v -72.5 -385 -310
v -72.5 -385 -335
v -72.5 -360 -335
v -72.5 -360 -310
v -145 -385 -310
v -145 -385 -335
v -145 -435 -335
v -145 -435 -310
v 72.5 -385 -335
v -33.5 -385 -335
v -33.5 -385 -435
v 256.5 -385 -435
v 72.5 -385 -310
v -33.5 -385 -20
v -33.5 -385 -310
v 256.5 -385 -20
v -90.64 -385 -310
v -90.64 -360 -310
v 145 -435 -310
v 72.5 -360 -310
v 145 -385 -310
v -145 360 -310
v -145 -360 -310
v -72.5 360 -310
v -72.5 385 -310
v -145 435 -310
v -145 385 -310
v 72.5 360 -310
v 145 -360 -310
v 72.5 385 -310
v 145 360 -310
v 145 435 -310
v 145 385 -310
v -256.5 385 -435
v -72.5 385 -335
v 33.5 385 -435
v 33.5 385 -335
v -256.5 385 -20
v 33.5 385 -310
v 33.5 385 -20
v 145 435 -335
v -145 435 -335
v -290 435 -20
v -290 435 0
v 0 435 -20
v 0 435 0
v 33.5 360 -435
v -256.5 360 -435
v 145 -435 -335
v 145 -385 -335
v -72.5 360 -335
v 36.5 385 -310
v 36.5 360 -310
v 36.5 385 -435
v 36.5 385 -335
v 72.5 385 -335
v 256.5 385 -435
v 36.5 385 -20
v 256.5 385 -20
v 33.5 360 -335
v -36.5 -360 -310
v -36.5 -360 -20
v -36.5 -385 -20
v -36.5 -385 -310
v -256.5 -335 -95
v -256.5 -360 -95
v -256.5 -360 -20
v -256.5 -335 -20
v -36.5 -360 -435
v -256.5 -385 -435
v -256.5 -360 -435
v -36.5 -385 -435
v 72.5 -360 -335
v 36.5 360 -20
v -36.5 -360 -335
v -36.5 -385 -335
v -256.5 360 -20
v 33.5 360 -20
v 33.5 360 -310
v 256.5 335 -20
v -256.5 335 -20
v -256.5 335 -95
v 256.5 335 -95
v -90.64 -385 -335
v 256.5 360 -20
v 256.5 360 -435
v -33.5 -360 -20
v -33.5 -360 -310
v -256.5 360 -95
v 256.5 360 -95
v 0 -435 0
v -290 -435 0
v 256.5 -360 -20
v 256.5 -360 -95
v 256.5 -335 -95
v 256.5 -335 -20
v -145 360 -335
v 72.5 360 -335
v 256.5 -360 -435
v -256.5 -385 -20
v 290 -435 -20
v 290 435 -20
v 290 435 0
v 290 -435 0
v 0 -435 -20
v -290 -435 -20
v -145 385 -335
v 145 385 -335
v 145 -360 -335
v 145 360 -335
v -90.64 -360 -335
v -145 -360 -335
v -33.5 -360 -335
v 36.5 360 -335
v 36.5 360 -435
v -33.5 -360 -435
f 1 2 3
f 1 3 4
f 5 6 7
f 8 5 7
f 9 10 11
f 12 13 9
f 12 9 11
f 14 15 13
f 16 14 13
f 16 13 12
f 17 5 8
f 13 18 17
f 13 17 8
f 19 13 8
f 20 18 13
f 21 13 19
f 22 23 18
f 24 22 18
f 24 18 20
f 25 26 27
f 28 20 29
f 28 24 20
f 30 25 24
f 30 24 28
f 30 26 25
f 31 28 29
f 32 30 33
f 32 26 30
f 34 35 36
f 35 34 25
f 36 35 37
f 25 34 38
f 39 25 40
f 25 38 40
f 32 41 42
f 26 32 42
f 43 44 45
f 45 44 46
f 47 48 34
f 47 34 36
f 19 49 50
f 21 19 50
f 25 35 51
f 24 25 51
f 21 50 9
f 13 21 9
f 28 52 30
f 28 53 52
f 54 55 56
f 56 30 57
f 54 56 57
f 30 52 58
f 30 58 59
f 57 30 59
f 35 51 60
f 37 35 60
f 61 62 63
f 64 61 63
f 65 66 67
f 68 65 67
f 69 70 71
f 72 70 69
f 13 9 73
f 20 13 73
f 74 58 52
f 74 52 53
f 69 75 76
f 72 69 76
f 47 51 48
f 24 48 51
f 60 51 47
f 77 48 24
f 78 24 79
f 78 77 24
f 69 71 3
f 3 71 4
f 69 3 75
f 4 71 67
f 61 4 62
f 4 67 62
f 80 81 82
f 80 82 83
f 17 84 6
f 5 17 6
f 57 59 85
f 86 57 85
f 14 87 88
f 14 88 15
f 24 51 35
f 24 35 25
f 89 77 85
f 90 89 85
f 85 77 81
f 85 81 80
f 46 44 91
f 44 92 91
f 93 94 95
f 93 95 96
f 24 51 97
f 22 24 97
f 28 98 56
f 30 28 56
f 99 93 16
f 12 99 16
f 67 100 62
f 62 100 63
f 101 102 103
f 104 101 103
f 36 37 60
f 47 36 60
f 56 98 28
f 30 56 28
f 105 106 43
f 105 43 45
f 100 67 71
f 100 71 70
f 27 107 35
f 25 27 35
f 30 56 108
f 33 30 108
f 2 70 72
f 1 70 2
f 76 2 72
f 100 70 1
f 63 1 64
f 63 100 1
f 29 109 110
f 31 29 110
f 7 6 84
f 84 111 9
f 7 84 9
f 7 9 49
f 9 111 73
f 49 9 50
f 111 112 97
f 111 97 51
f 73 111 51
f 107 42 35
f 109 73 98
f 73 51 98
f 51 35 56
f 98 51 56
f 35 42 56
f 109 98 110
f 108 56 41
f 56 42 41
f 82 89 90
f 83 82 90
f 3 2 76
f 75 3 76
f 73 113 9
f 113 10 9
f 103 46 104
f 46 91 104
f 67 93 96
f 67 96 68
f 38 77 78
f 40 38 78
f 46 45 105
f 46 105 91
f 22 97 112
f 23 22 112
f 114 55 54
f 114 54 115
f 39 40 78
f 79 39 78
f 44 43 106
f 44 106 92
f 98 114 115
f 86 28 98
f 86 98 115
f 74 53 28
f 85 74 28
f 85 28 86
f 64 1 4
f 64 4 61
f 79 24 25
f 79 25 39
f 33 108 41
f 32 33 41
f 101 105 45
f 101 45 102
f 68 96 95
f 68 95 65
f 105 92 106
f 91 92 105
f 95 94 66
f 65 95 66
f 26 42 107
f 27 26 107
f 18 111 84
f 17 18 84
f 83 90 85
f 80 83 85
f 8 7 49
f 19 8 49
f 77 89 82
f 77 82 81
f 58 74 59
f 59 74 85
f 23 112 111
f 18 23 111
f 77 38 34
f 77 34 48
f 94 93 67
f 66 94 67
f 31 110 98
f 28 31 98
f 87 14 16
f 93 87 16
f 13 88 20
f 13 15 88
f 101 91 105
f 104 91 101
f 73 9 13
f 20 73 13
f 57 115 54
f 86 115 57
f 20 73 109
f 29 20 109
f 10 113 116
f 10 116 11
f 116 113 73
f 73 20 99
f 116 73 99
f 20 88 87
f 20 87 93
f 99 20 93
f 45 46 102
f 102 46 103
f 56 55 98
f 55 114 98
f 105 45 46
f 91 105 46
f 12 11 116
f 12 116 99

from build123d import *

# Parameters (mm, degrees)
F0_W      = 290
F0_H      = 20
F1_DEPTH  = 435
F2_W      = 290
F2_H      = 20
F3_DEPTH  = 435
F4_W      = 220
F4_H      = 25
F4_W_2    = 290
F5_DEPTH  = 415
F6_W      = 145
F6_H      = 25
F7_DEPTH  = 500
F9_DEPTH  = 25
F10_W     = 513
F10_H     = 75
F11_DEPTH = 25
F12_W     = 513
F12_H     = 75
F13_DEPTH = 25


with BuildPart() as f1:
    # F0 (on Front) → F1 (new body, symmetric)
    with BuildSketch(Plane.XZ):
        with Locations((-145, -10)):
            Rectangle(F0_W, F0_H)
    extrude(amount=F1_DEPTH, both=True)


with BuildPart() as f3:
    # F2 (on Front) → F3 (new body, symmetric)
    with BuildSketch(Plane.XZ):
        with Locations((145, -10)):
            Rectangle(F2_W, F2_H)
    extrude(amount=F3_DEPTH, both=True)


with BuildPart() as f5:
    # F4 (on face) → F5 (new body)
    with BuildSketch(Plane(origin=(0, 0, -20), x_dir=(1, 0, 0), z_dir=(0, 0, -1))):
        with Locations((-146.5, 372.5)):
            Rectangle(F4_W, F4_H)
        with Locations((111.5, 372.5)):
            Rectangle(F4_W_2, F4_H)
        with Locations((146.5, -372.5)):
            Rectangle(F4_W, F4_H)
        with Locations((-111.5, -372.5)):
            Rectangle(F4_W_2, F4_H)
    extrude(amount=F5_DEPTH)

    # F6 (on Front) → F7 (cut, symmetric)
    with BuildSketch(Plane.XZ):
        with Locations((0, -322.5)):
            Rectangle(F6_W, F6_H)
    extrude(amount=F7_DEPTH, both=True, mode=Mode.SUBTRACT)


with BuildPart() as f9:
    # F8 (on face) → F9 (new body)
    with BuildSketch(Plane.XY.offset(-335)):
        Polygon((145, 435), (-145, 435), (-145, 385), (-72.5, 385), (-72.5, 360), (-145, 360), (-145, -360), (-90.640374, -360), (-90.640374, -385), (-145, -385), (-145, -435), (145, -435), (145, -385), (72.5, -385), (72.5, -360), (145, -360), (145, 360), (72.5, 360), (72.5, 385), (145, 385), align=None)
    extrude(amount=F9_DEPTH)


with BuildPart() as f11:
    # F10 (on face) → F11 (new body)
    with BuildSketch(Plane.XZ.offset(-360)):
        with Locations((0, -57.5)):
            Rectangle(F10_W, F10_H)
    extrude(amount=F11_DEPTH)


with BuildPart() as f13:
    # F12 (on face) → F13 (new body)
    with BuildSketch(Plane(origin=(0, -360, 0), x_dir=(-1, 0, 0), z_dir=(0, 1, 0))):
        with Locations((0, -57.5)):
            Rectangle(F12_W, F12_H)
    extrude(amount=F13_DEPTH)


solid = Compound([f1.part, f3.part, f5.part, f9.part, f11.part, f13.part])
